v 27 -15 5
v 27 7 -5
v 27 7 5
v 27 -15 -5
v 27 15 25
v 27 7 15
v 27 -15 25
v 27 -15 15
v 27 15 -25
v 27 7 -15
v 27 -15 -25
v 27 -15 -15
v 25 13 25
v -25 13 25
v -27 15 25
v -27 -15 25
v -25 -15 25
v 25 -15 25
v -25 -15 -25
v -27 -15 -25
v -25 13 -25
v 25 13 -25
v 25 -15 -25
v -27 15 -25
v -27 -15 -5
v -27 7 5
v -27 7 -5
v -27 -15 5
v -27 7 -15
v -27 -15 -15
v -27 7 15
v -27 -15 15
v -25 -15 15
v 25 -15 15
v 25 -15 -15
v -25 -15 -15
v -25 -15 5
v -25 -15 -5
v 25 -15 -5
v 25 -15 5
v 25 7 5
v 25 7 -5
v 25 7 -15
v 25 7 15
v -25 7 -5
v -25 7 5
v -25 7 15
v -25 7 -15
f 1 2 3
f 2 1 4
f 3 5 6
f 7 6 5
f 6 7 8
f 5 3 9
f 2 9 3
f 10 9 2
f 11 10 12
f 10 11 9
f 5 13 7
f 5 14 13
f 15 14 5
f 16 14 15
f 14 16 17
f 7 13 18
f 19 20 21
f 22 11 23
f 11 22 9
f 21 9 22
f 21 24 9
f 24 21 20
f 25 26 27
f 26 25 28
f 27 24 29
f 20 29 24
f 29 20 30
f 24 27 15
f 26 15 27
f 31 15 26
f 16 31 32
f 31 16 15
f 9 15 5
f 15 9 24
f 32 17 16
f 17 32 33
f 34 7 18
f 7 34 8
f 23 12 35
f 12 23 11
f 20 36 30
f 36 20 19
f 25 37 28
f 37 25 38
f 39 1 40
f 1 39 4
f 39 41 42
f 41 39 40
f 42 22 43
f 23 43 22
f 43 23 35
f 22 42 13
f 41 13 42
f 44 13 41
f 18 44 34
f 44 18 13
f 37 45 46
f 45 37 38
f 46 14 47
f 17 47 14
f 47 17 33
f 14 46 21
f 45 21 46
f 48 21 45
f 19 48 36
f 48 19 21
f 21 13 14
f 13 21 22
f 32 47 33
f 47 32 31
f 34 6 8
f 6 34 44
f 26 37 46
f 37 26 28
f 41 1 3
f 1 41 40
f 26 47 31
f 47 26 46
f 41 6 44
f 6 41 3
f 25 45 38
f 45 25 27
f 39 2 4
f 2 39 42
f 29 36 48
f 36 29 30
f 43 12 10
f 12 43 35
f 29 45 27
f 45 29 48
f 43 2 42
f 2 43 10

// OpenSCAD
//CUSTOMIZER VARIABLES

//	This section is displays the box options
//	Measurement of box on the X axis
inside_dimension = 50;		

//	Measurement of box on the Y axis
//y_measurement = 30;		

//	Measurement of box on the Z axis
//z_measurement = 50;

//	This creates a drop down box of numbered options
//number_drop_down_box = 1;	//	[0,1,2,3,4,5,6,7,8,9,10]

//	This creates a drop down box of text options
//text_drop_down_box = "yes";	//	[yes,no,maybe]

//	This creates a drop down box of text options with numerical values
//labeled_drop_down_box = 5;	//	[1:small, 5:medium, 10:large, 50:supersized]

//	This creates a slider with a minimum and maximum
//numerical_slider = 1;	//	[30:80]



//CUSTOMIZER VARIABLES END

//	This is the cube we've customized!
difference() {
    
     cube([inside_dimension+4,30,50], center=true);
     translate([0,-2,0]) {
           cube([inside_dimension,30,52], center=true); 
        }
      translate([0,-8,10]) {
         cube([100,30,10], center=true); 
       } 
      translate([0,-8,-10]) {
         cube([100,30,10], center=true); 
       } 

}
